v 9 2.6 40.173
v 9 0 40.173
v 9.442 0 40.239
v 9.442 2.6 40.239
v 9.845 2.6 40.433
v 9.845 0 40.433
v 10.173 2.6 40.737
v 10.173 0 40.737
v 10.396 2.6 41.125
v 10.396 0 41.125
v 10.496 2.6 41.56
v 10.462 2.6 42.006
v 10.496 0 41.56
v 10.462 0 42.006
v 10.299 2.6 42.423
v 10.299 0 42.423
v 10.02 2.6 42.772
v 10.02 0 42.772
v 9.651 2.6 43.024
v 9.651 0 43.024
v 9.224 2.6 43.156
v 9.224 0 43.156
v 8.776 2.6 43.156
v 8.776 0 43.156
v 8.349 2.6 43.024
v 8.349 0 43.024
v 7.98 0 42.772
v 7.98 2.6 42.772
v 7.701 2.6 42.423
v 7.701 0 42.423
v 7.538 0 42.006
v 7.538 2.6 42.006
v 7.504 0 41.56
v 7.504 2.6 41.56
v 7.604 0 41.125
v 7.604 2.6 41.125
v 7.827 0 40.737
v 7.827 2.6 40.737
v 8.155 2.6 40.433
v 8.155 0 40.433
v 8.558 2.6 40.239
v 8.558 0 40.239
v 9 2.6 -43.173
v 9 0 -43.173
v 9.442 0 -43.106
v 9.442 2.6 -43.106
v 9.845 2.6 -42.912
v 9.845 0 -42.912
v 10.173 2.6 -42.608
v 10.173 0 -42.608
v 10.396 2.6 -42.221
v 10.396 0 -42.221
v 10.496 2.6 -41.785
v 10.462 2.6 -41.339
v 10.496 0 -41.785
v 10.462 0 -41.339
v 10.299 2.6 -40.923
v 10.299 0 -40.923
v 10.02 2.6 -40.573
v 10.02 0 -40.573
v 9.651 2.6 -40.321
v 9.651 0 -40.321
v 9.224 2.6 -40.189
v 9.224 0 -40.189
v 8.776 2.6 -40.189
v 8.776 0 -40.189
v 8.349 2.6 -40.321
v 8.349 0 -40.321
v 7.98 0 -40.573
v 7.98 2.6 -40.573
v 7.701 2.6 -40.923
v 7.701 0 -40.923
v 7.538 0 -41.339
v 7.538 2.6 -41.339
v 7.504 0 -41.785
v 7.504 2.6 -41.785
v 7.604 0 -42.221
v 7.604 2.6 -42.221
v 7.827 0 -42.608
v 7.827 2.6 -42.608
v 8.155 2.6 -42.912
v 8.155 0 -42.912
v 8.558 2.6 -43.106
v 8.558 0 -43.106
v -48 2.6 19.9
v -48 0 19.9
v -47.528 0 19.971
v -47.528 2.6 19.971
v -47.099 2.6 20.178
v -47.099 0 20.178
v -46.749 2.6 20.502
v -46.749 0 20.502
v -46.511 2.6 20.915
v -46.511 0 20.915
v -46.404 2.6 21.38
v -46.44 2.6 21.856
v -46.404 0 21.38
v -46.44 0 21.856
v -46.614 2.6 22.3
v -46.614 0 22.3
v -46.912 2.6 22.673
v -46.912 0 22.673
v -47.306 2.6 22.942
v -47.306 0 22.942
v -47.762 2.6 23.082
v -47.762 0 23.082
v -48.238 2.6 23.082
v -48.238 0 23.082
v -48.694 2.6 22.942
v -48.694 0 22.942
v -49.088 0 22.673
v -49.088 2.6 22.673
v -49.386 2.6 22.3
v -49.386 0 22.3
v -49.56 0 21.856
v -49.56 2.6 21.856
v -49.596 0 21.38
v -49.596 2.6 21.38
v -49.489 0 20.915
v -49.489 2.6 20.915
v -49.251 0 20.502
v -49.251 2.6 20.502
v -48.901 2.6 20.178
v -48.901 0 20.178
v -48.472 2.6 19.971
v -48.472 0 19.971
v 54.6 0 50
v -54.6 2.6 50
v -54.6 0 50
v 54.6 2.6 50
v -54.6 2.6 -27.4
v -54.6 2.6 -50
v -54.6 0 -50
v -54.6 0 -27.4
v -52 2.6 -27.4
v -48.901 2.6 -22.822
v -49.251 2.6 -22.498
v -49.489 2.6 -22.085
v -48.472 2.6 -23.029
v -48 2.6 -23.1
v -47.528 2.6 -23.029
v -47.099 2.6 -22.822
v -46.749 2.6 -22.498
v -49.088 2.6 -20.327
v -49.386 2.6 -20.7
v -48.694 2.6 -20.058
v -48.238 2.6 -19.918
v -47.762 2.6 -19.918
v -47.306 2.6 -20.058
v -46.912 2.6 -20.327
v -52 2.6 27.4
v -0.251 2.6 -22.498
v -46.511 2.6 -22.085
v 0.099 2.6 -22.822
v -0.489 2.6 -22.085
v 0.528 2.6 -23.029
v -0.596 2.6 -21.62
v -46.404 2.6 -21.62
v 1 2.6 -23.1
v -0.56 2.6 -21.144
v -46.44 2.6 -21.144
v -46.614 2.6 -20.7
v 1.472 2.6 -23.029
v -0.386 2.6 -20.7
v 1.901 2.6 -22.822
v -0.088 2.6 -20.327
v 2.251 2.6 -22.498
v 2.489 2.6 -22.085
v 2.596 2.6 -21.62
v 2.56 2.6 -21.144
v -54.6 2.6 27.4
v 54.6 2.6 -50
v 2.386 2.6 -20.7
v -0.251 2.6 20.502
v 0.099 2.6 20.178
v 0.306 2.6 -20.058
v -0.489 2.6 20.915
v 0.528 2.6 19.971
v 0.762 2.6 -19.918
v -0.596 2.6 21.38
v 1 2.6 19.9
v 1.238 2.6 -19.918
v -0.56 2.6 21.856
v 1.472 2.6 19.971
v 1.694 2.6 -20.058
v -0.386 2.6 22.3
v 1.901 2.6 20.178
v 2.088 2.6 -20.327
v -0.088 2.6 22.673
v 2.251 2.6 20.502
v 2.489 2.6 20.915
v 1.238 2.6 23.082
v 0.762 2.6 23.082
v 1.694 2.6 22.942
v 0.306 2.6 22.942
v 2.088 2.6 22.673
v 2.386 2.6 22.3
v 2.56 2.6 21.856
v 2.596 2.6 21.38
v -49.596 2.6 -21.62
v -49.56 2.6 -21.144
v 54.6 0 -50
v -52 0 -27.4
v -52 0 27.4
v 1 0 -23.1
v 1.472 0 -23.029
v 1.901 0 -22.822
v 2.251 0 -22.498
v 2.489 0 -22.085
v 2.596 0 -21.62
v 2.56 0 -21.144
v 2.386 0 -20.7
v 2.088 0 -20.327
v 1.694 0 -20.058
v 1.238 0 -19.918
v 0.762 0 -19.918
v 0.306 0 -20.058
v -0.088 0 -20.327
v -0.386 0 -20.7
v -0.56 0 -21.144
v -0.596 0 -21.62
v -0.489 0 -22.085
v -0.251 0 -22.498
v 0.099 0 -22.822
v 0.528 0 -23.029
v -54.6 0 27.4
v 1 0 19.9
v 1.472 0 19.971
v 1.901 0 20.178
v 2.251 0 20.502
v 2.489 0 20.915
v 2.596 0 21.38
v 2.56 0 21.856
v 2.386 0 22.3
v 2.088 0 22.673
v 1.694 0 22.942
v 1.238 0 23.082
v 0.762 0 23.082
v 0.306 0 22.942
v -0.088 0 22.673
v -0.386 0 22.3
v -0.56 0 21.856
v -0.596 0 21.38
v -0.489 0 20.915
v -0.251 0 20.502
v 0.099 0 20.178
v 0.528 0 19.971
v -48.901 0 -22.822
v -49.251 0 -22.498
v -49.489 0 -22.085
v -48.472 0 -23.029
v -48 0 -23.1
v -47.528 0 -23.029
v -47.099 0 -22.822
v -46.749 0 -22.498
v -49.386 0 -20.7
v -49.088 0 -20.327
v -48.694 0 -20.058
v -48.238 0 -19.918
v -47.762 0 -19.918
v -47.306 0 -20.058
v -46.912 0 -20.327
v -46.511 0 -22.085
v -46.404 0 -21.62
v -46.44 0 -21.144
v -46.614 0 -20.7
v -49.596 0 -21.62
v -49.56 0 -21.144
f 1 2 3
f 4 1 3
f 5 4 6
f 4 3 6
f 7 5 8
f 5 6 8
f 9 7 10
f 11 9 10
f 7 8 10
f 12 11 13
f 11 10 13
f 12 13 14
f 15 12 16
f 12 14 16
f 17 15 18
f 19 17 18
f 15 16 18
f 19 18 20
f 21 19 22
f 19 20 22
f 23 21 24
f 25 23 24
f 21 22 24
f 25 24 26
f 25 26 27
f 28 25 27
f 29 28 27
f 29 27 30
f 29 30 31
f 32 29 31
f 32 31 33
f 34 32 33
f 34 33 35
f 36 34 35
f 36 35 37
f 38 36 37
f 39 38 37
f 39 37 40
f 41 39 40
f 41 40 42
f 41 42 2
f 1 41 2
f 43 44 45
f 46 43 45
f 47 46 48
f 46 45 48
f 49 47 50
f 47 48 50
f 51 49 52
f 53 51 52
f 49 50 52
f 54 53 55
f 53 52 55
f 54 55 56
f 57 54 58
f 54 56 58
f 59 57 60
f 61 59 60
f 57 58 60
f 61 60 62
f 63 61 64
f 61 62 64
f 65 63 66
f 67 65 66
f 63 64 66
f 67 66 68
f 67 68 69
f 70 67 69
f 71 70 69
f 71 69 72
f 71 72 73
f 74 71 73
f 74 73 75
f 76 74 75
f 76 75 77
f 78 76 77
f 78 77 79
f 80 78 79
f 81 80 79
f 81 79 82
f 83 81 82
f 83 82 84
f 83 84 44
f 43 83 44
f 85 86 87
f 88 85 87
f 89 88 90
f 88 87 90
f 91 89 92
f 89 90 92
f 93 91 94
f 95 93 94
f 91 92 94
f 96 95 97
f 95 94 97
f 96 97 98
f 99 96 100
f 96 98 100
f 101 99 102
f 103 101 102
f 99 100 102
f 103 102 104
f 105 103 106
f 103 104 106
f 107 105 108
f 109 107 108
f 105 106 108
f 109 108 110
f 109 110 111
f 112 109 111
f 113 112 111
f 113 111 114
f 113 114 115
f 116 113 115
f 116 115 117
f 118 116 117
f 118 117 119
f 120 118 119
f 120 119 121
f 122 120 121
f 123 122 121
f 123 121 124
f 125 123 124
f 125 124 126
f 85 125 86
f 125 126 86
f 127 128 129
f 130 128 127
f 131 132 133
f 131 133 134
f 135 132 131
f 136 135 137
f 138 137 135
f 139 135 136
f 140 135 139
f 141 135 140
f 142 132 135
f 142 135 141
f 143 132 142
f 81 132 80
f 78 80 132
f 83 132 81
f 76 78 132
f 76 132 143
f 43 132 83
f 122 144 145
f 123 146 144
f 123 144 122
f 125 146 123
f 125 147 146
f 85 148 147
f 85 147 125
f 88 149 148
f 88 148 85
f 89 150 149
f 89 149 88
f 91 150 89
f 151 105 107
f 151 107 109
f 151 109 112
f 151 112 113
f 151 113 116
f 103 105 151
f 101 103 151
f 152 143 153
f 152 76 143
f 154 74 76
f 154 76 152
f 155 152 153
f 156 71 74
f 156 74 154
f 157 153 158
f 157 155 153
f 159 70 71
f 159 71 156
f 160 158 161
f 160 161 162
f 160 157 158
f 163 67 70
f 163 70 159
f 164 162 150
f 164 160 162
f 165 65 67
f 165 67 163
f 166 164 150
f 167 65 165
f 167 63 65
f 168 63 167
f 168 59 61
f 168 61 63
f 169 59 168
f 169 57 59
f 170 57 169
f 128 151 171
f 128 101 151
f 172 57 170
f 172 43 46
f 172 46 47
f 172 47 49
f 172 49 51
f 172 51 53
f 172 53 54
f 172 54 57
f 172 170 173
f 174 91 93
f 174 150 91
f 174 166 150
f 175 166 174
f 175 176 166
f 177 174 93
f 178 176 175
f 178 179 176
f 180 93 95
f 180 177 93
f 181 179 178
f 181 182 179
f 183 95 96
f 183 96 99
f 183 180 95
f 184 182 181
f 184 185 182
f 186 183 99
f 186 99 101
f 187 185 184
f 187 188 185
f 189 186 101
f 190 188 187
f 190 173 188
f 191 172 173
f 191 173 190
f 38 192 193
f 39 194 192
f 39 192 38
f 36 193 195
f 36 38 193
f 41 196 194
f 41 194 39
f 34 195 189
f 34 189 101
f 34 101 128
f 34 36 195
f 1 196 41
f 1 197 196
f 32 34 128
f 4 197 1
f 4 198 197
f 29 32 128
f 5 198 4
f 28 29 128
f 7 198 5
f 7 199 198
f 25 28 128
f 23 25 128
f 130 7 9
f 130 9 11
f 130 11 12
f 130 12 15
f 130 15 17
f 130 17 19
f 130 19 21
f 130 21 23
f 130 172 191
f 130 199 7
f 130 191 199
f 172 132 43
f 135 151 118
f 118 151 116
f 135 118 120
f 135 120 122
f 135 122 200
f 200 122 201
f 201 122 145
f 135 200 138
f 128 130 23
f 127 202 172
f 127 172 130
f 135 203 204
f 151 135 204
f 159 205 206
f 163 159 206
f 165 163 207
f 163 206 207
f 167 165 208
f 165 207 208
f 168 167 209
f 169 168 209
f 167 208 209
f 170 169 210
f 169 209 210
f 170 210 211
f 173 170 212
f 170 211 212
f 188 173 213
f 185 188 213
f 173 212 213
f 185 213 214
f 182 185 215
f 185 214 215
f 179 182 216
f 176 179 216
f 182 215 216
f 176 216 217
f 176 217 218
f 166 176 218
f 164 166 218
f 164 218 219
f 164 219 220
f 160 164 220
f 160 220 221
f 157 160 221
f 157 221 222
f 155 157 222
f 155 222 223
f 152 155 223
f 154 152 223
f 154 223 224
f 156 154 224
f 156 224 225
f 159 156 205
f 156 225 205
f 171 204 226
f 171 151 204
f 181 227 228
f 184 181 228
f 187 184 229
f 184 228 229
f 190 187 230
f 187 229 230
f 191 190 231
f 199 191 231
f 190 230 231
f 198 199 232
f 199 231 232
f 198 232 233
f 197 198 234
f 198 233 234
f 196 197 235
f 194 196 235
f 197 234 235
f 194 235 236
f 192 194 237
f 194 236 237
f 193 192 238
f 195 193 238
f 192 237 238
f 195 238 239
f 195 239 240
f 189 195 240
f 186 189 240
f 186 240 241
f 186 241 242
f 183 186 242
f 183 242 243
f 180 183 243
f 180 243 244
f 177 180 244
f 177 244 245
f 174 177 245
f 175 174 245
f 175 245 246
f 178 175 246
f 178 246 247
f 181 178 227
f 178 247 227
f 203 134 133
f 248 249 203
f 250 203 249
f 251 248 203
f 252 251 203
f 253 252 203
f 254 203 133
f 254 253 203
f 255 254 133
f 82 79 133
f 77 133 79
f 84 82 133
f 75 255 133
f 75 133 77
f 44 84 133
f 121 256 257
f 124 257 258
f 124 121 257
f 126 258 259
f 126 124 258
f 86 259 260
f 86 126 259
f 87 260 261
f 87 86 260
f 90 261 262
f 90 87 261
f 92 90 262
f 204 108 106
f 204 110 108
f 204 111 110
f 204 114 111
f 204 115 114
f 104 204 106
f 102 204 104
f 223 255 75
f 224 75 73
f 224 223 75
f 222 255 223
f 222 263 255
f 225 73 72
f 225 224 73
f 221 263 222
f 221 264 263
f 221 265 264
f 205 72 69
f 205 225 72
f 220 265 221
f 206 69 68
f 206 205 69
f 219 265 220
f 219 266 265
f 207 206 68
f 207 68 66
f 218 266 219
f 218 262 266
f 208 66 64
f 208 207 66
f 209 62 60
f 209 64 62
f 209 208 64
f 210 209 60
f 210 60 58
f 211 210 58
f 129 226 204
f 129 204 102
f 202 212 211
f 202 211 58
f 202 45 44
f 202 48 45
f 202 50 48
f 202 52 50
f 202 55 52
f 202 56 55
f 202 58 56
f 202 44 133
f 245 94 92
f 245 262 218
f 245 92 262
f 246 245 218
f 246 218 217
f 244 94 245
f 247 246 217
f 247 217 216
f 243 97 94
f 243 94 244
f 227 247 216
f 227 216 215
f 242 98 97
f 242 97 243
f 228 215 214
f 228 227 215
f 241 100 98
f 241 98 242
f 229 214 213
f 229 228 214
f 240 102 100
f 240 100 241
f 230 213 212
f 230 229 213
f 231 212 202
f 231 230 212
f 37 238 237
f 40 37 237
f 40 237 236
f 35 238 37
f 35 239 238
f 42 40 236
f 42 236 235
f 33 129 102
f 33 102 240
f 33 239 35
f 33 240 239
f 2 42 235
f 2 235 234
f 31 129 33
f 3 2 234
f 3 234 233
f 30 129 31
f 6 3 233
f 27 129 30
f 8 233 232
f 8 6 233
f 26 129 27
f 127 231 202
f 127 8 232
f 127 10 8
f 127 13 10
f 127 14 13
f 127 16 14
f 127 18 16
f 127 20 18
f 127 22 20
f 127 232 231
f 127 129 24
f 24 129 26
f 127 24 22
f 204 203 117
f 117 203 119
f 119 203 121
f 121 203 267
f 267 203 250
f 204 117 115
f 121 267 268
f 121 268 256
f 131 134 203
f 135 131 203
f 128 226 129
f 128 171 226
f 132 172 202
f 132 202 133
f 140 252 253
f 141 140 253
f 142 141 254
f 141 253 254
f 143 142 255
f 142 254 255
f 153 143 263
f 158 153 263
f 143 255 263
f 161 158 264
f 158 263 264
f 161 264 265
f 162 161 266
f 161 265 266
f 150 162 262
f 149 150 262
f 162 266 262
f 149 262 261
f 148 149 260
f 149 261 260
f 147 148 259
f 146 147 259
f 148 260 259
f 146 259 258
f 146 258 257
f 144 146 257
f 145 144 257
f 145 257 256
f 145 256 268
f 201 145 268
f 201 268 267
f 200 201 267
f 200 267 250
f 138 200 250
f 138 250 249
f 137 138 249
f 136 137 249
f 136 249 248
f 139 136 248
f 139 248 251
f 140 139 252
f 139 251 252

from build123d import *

# Parameters (mm, degrees)
EXTRUDE_1_DEPTH                  = 2.6
SKETCH_2_W                       = 100
SKETCH_2_H                       = 24
EXTRUDE_2_DEPTH                  = 2.6
SKETCH_4_W                       = 100
SKETCH_4_H                       = 24
EXTRUDE_3_DEPTH                  = 2.6
SKETCH_5_W                       = 62
SKETCH_5_H                       = 100
EXTRUDE_5_DEPTH                  = 2.6
SKETCH_7_W                       = 62
SKETCH_7_H                       = 100
EXTRUDE_6_DEPTH                  = 2.6
SKETCH_8_W                       = 59.4
SKETCH_8_H                       = 60
CUT_EXTRUDE_1_DEPTH              = 2.6
SKETCH_9_W                       = 59.4
SKETCH_9_H                       = 60
CUT_EXTRUDE_2_DEPTH              = 2.6
SKETCH_11_W                      = 59.4
SKETCH_11_H                      = 26.6
EXTRUDE_7_DEPTH                  = 2.6
SKETCH_12_W                      = 59.4
SKETCH_12_H                      = 26.6
EXTRUDE_8_DEPTH                  = 2.6
SKETCH_14_W                      = 59.4
SKETCH_14_H                      = 26.6
EXTRUDE_9_DEPTH                  = 2.6
SKETCH_15_W                      = 59.4
SKETCH_15_H                      = 26.6
EXTRUDE_10_DEPTH                 = 2.6
SKETCH_16_R                      = 1.6
CUT_EXTRUDE_3_DEPTH              = 127.775391934
SKETCH_17_W                      = 80
SKETCH_17_H                      = 64
CUT_EXTRUDE_4_DEPTH              = 127.775391934
SKETCH_21_W                      = 59.4
SKETCH_21_H                      = 54.8
EXTRUDE_11_DEPTH                 = 2.6
SKETCH_22_R                      = 1.6
CUT_EXTRUDE_5_DEPTH              = 2.6
SKETCH_23_W                      = 59.4
SKETCH_23_H                      = 54.8
EXTRUDE_13_DEPTH                 = 2.6
CUT_EXTRUDE_8_DEPTH              = 2.6
SKETCH_25_W                      = 54.8
SKETCH_25_H                      = 21.4
CUT_EXTRUDE_9_DEPTH              = 2.6
CUT_EXTRUDE_11_REACH             = 143.787
SKETCH_28_R                      = 1.5
CUT_EXTRUDE_11_DIRECTION_2_DEPTH = 142.787023384
SKETCH_31_W                      = 41.995824489
SKETCH_31_H                      = 54.8
CUT_EXTRUDE_14_DEPTH             = 2.6
SKETCH_32_W                      = 59.4
SKETCH_32_H                      = 24
CUT_EXTRUDE_15_DEPTH             = 70.6
SKETCH_33_W                      = 104
SKETCH_33_H                      = 100
CUT_EXTRUDE_16_DEPTH             = 2.6
SKETCH_34_W                      = 104
SKETCH_34_H                      = 99.672593916
EXTRUDE_14_DEPTH                 = 2.6
SKETCH_35_R                      = 1.6
CUT_EXTRUDE_24_DEPTH             = 2.6
SKETCH_36_W                      = 59.4
SKETCH_36_H                      = 100
CUT_EXTRUDE_25_DEPTH             = 2.6
SKETCH_37_W                      = 36
SKETCH_37_H                      = 2.6
EXTRUDE_17_DEPTH                 = 36
SKETCH_41_W                      = 36
SKETCH_41_H                      = 12
CUT_EXTRUDE_27_DEPTH             = 2.6
SKETCH_42_R                      = 1.6
CUT_EXTRUDE_28_DEPTH             = 2.6
SKETCH_43_R                      = 2
CUT_EXTRUDE_29_DEPTH             = 2.6
SKETCH_44_W                      = 104
SKETCH_44_H                      = 99.672593916
EXTRUDE_18_DEPTH                 = 2.6
SKETCH_45_R                      = 1.6
CUT_EXTRUDE_30_DEPTH             = 2.6
SKETCH_46_W                      = 80
SKETCH_46_H                      = 64
CUT_EXTRUDE_31_DEPTH             = 2.6
SKETCH_47_W                      = 40
SKETCH_47_H                      = 30
CUT_EXTRUDE_32_DEPTH             = 2.6
SKETCH_48_W                      = 12
SKETCH_48_H                      = 64
CUT_EXTRUDE_33_DEPTH             = 2.6
SKETCH_49_W                      = 40
SKETCH_49_H                      = 20
CUT_EXTRUDE_34_DEPTH             = 2.6
SKETCH_50_W                      = 39.937786469
SKETCH_50_H                      = 20
CUT_EXTRUDE_35_DEPTH             = 2.6
SKETCH_51_R                      = 9
CUT_EXTRUDE_36_DEPTH             = 2.6
CUT_EXTRUDE_38_REACH             = 143.787
SKETCH_52_W                      = 15
SKETCH_52_H                      = 15
SKETCH_55_W                      = 36
SKETCH_55_H                      = 2.6
CUT_EXTRUDE_39_DEPTH             = 12
CUT_EXTRUDE_START                = -109.2
SKETCH_56_W                      = 10
SKETCH_56_H                      = 10
CUT_EXTRUDE_40_DEPTH             = 109.2
CUT_EXTRUDE_41_REACH             = 129.293
SKETCH_57_R                      = 1.5
SKETCH_58_W                      = 104
SKETCH_58_H                      = 2.6
EXTRUDE_19_DEPTH                 = 0.327406084
SKETCH_59_W                      = 59.4
SKETCH_59_H                      = 24
CUT_EXTRUDE_42_DEPTH             = 60
SKETCH_60_W                      = 168.6
SKETCH_60_H                      = 100
CUT_EXTRUDE_43_DEPTH             = 2.6
CUT_EXTRUDE_44_DEPTH             = 200
CUT_EXTRUDE_44_DEPTH_BACK        = 200
SKETCH_61_W                      = 100
SKETCH_61_H                      = 21.4
SKETCH_62_W                      = 20
SKETCH_62_H                      = 2.6
EXTRUDE_20_DEPTH                 = 39.937786469
SKETCH_63_W                      = 40
SKETCH_63_H                      = 2.6
EXTRUDE_21_DEPTH                 = 50
SKETCH_64_R                      = 1.6
CUT_EXTRUDE_45_DEPTH             = 2.6
SKETCH_65_R                      = 1.6
EXTRUDE_23_DEPTH                 = 2.6


with BuildPart() as part:
    # 草图1 → 凸台-拉伸1 (new body)
    with BuildSketch(Plane(origin=(0, 0, 0), x_dir=(1, 0, 0), z_dir=(0, 1, 0))):
        Polygon((52, 50), (0, 50), (-52, 50), (-52, -50), (52, -50), align=None)
    extrude(amount=EXTRUDE_1_DEPTH)

    # 草图2 → 凸台-拉伸2 (add)
    with BuildSketch(Plane.ZY.offset(52)):
        with Locations((0, 12)):
            Rectangle(SKETCH_2_W, SKETCH_2_H)
    extrude(amount=EXTRUDE_2_DEPTH)

    # 草图4 → 凸台-拉伸3 (add)
    with BuildSketch(Plane(origin=(52, 0, 0), x_dir=(0, 0, -1), z_dir=(1, 0, 0))):
        with Locations((0, 12)):
            Rectangle(SKETCH_4_W, SKETCH_4_H)
    extrude(amount=EXTRUDE_3_DEPTH)

    # 草图5 → 凸台-拉伸5 (add)
    with BuildSketch(Plane(origin=(0, 24, 0), x_dir=(1, 0, 0), z_dir=(0, 1, 0))):
        with Locations((-83, 0)):
            Rectangle(SKETCH_5_W, SKETCH_5_H)
    extrude(amount=EXTRUDE_5_DEPTH)

    # 草图7 → 凸台-拉伸6 (add)
    with BuildSketch(Plane(origin=(0, 24, 0), x_dir=(1, 0, 0), z_dir=(0, 1, 0))):
        with Locations((83, 0)):
            Rectangle(SKETCH_7_W, SKETCH_7_H)
    extrude(amount=EXTRUDE_6_DEPTH)

    # 草图8 → 切除-拉伸1 (cut)
    with BuildSketch(Plane(origin=(0, 24, 0), x_dir=(1, 0, 0), z_dir=(0, 1, 0))):
        with Locations((-84.3, 0)):
            Rectangle(SKETCH_8_W, SKETCH_8_H)
    extrude(amount=CUT_EXTRUDE_1_DEPTH, mode=Mode.SUBTRACT)

    # 草图9 → 切除-拉伸2 (cut)
    with BuildSketch(Plane.XZ.offset(-24)):
        with Locations((84.3, 0)):
            Rectangle(SKETCH_9_W, SKETCH_9_H)
    extrude(amount=-CUT_EXTRUDE_2_DEPTH, mode=Mode.SUBTRACT)

    # 草图11 → 凸台-拉伸7 (add)
    with BuildSketch(Plane(origin=(0, 0, 30), x_dir=(-1, 0, 0), z_dir=(0, 0, -1))):
        with Locations((-84.3, 13.3)):
            Rectangle(SKETCH_11_W, SKETCH_11_H)
    extrude(amount=EXTRUDE_7_DEPTH)

    # 草图12 → 凸台-拉伸8 (add)
    with BuildSketch(Plane.XY.offset(-30)):
        with Locations((84.3, 13.3)):
            Rectangle(SKETCH_12_W, SKETCH_12_H)
    extrude(amount=EXTRUDE_8_DEPTH)

    # 草图14 → 凸台-拉伸9 (add)
    with BuildSketch(Plane.XY.offset(-30)):
        with Locations((-84.3, 13.3)):
            Rectangle(SKETCH_14_W, SKETCH_14_H)
    extrude(amount=EXTRUDE_9_DEPTH)

    # 草图15 → 凸台-拉伸10 (add)
    with BuildSketch(Plane(origin=(0, 0, 30), x_dir=(-1, 0, 0), z_dir=(0, 0, -1))):
        with Locations((84.3, 13.3)):
            Rectangle(SKETCH_15_W, SKETCH_15_H)
    extrude(amount=EXTRUDE_10_DEPTH)

    # 草图16 → 切除-拉伸3 (cut, through all)
    with BuildSketch(Plane(origin=(0, 2.6, 0), x_dir=(1, 0, 0), z_dir=(0, 1, 0))):
        with Locations(Location((-47.5, 37.465, 0), (0, 0, 270))):
            Circle(SKETCH_16_R)
        with Locations(Location((47.5, 37.465, 0), (0, 0, 90))):
            Circle(SKETCH_16_R)
        with Locations(Location((-47.5, -37.465, 0), (0, 0, 90))):
            Circle(SKETCH_16_R)
        with Locations(Location((47.5, -37.465, 0), (0, 0, 270))):
            Circle(SKETCH_16_R)
    extrude(amount=-CUT_EXTRUDE_3_DEPTH, mode=Mode.SUBTRACT)

    # 草图17 → 切除-拉伸4 (cut, through all)
    with BuildSketch(Plane(origin=(0, 2.6, 0), x_dir=(1, 0, 0), z_dir=(0, 1, 0))):
        Rectangle(SKETCH_17_W, SKETCH_17_H)
    extrude(amount=-CUT_EXTRUDE_4_DEPTH, mode=Mode.SUBTRACT)

    # 草图21 → 凸台-拉伸11 (add)
    with BuildSketch(Plane.XZ):
        with Locations((-84.3, 0)):
            Rectangle(SKETCH_21_W, SKETCH_21_H)
    extrude(amount=-EXTRUDE_11_DEPTH)

    # 草图22 → 切除-拉伸5 (cut)
    with BuildSketch(Plane(origin=(0, 2.6, 0), x_dir=(1, 0, 0), z_dir=(0, 1, 0))):
        with Locations(Location((-109, 18, 0), (0, 0, 270))):
            Circle(SKETCH_22_R)
        with Locations(Location((-109, 0, 0), (0, 0, 270))):
            Circle(SKETCH_22_R)
        with Locations(Location((-109, -18, 0), (0, 0, 90))):
            Circle(SKETCH_22_R)
    extrude(amount=-CUT_EXTRUDE_5_DEPTH, mode=Mode.SUBTRACT)

    # 草图23 → 凸台-拉伸13 (add)
    with BuildSketch(Plane(origin=(0, 26.6, 0), x_dir=(1, 0, 0), z_dir=(0, 1, 0))):
        with Locations((-84.3, 0)):
            Rectangle(SKETCH_23_W, SKETCH_23_H)
    extrude(amount=-EXTRUDE_13_DEPTH)

    # 草图24 → 切除-拉伸8 (cut)
    with BuildSketch(Plane(origin=(0, 26.6, 0), x_dir=(1, 0, 0), z_dir=(0, 1, 0))):
        Polygon((-114, 27.4), (-104, 27.4), (-104, 0.9702404), (-94.7, 0.9702404), (-94.7, 6.15), (-72, 6.15), (-72, 0.9702404), (-62.7, 0.9702404), (-62.7, -1.0297596), (-72, -1.0297596), (-72, -6.15), (-94.7, -6.15), (-94.7, -1.0297596), (-104, -1.0297596), (-104, -27.4), (-114, -27.4), align=None)
    extrude(amount=-CUT_EXTRUDE_8_DEPTH, mode=Mode.SUBTRACT)

    # 草图25 → 切除-拉伸9 (cut)
    with BuildSketch(Plane.ZY.offset(54.6)):
        with Locations((0, 13.3)):
            Rectangle(SKETCH_25_W, SKETCH_25_H)
    extrude(amount=-CUT_EXTRUDE_9_DEPTH, mode=Mode.SUBTRACT)

    # 切除-拉伸11: up to this face of the body (flat: up to its plane)
    cut_extrude_11_end = Plane(part.part.faces().sort_by_distance((-84.3, 12, -30))[0])
    # 草图28 → 切除-拉伸11 (cut, up to the picked face)
    with BuildSketch(Plane.XY.offset(30), mode=Mode.PRIVATE) as cut_extrude_11_sk1:
        with Locations(Location((-87.2, 20.75, 0), (0, 0, 180))):
            Circle(SKETCH_28_R)
    cut_extrude_11_tool1 = split(extrude(cut_extrude_11_sk1.sketch, amount=-CUT_EXTRUDE_11_REACH, mode=Mode.PRIVATE), bisect_by=cut_extrude_11_end, keep=Keep.BOTH, mode=Mode.PRIVATE)
    # 草图28 → 切除-拉伸11 (cut, up to the picked face)
    with BuildSketch(Plane.XY.offset(30), mode=Mode.PRIVATE) as cut_extrude_11_sk2:
        with Locations(Location((-87.2, 3.25, 0), (0, 0, 180))):
            Circle(SKETCH_28_R)
    cut_extrude_11_tool2 = split(extrude(cut_extrude_11_sk2.sketch, amount=-CUT_EXTRUDE_11_REACH, mode=Mode.PRIVATE), bisect_by=cut_extrude_11_end, keep=Keep.BOTH, mode=Mode.PRIVATE)
    add(cut_extrude_11_tool1.solids().sort_by(Axis((-87.2, 20.75, 30), (0, 0, -1)))[0], mode=Mode.SUBTRACT)
    add(cut_extrude_11_tool2.solids().sort_by(Axis((-87.2, 3.25, 30), (0, 0, -1)))[0], mode=Mode.SUBTRACT)

    # 草图28 → 切除-拉伸11 direction 2 (cut)
    with BuildSketch(Plane.XY.offset(30)):
        with Locations(Location((-87.2, 20.75, 0), (0, 0, 180))):
            Circle(SKETCH_28_R)
        with Locations(Location((-87.2, 3.25, 0), (0, 0, 180))):
            Circle(SKETCH_28_R)
    extrude(amount=CUT_EXTRUDE_11_DIRECTION_2_DEPTH, mode=Mode.SUBTRACT)

    # 草图31 → 切除-拉伸14 (cut)
    with BuildSketch(Plane(origin=(0, 2.6, 0), x_dir=(1, 0, 0), z_dir=(0, 1, 0))):
        with Locations((-72.997912245, 0)):
            Rectangle(SKETCH_31_W, SKETCH_31_H)
    extrude(amount=-CUT_EXTRUDE_14_DEPTH, mode=Mode.SUBTRACT)

    # 草图32 → 切除-拉伸15 (cut)
    with BuildSketch(Plane.XY.offset(30)):
        with Locations((84.3, 12)):
            Rectangle(SKETCH_32_W, SKETCH_32_H)
    extrude(amount=-CUT_EXTRUDE_15_DEPTH, mode=Mode.SUBTRACT)

    # 草图33 → 切除-拉伸16 (cut)
    with BuildSketch(Plane(origin=(0, 2.6, 0), x_dir=(1, 0, 0), z_dir=(0, 1, 0))):
        Rectangle(SKETCH_33_W, SKETCH_33_H)
    extrude(amount=-CUT_EXTRUDE_16_DEPTH, mode=Mode.SUBTRACT)


with BuildPart() as cut_extrude_16_piece_1:
    # of the separate pieces the step leaves, piece 1, a body of its own (cut_extrude_16_pieces)
    add(part.part.solids().sort_by_distance((-52, 0, -50))[0])



with BuildPart() as cut_extrude_16_piece_2:
    # of the separate pieces the step leaves, piece 2, a body of its own (cut_extrude_16_pieces)
    add(part.part.solids().sort_by_distance((114, 26.6, -50))[0])


with BuildPart() as cut_extrude_16_piece_1_1:
    add(cut_extrude_16_piece_1.part)

    add(cut_extrude_16_piece_2.part)  # 凸台-拉伸14 merges 切除-拉伸16 piece 2
    # 草图34 → 凸台-拉伸14 (add)
    with BuildSketch(Plane.XZ):
        with Locations((0, 0.163703042)):
            Rectangle(SKETCH_34_W, SKETCH_34_H)
    extrude(amount=-EXTRUDE_14_DEPTH)

    # 草图35 → 切除-拉伸24 (cut)
    with BuildSketch(Plane(origin=(0, 2.6, 0), x_dir=(1, 0, 0), z_dir=(0, 1, 0))):
        with Locations(Location((-39.5, 21.5, 0), (0, 0, 270))):
            Circle(SKETCH_35_R)
        with Locations(Location((9.5, 21.5, 0), (0, 0, 270))):
            Circle(SKETCH_35_R)
        with Locations(Location((9.5, -21.5, 0), (0, 0, 90))):
            Circle(SKETCH_35_R)
        with Locations(Location((-39.5, -21.5, 0), (0, 0, 90))):
            Circle(SKETCH_35_R)
    extrude(amount=-CUT_EXTRUDE_24_DEPTH, mode=Mode.SUBTRACT)

    # 草图36 → 切除-拉伸25 (cut)
    with BuildSketch(Plane(origin=(0, 26.6, 0), x_dir=(1, 0, 0), z_dir=(0, 1, 0))):
        with Locations((84.3, 0)):
            Rectangle(SKETCH_36_W, SKETCH_36_H)
    extrude(amount=-CUT_EXTRUDE_25_DEPTH, mode=Mode.SUBTRACT)

    # 草图37 → 凸台-拉伸17 (add)
    with BuildSketch(Plane(origin=(54.6, 0, 0), x_dir=(0, 0, -1), z_dir=(1, 0, 0))):
        with Locations((0, 13.3)):
            Rectangle(SKETCH_37_W, SKETCH_37_H)
    extrude(amount=EXTRUDE_17_DEPTH)

    # 草图41 → 切除-拉伸27 (cut)
    with BuildSketch(Plane(origin=(54.6, 0, 0), x_dir=(0, 0, -1), z_dir=(1, 0, 0))):
        with Locations((0, 20.6)):
            Rectangle(SKETCH_41_W, SKETCH_41_H)
    extrude(amount=-CUT_EXTRUDE_27_DEPTH, mode=Mode.SUBTRACT)

    # 草图42 → 切除-拉伸28 (cut)
    with BuildSketch(Plane(origin=(0, 14.6, 0), x_dir=(1, 0, 0), z_dir=(0, 1, 0))):
        with Locations(Location((88.1, 15.5, 0), (0, 0, 270))):
            Circle(SKETCH_42_R)
        with Locations(Location((88.1, -15.5, 0), (0, 0, 90))):
            Circle(SKETCH_42_R)
        with Locations(Location((57.1, 15.5, 0), (0, 0, 270))):
            Circle(SKETCH_42_R)
        with Locations(Location((57.1, -15.5, 0), (0, 0, 90))):
            Circle(SKETCH_42_R)
    extrude(amount=-CUT_EXTRUDE_28_DEPTH, mode=Mode.SUBTRACT)

    # 草图43 → 切除-拉伸29 (cut)
    with BuildSketch(Plane(origin=(0, 14.6, 0), x_dir=(1, 0, 0), z_dir=(0, 1, 0))):
        with Locations(Location((61.1, 14.5, 0), (0, 0, 270))):
            Circle(SKETCH_43_R)
        with Locations(Location((84.1, 14.5, 0), (0, 0, 270))):
            Circle(SKETCH_43_R)
        with Locations(Location((84.1, -14.5, 0), (0, 0, 90))):
            Circle(SKETCH_43_R)
        with Locations(Location((61.1, -14.5, 0), (0, 0, 90))):
            Circle(SKETCH_43_R)
    extrude(amount=-CUT_EXTRUDE_29_DEPTH, mode=Mode.SUBTRACT)

    # 草图44 → 凸台-拉伸18 (add)
    with BuildSketch(Plane(origin=(0, 26.6, 0), x_dir=(1, 0, 0), z_dir=(0, 1, 0))):
        with Locations((0, -0.163703042)):
            Rectangle(SKETCH_44_W, SKETCH_44_H)
    extrude(amount=-EXTRUDE_18_DEPTH)

    # 草图45 → 切除-拉伸30 (cut)
    with BuildSketch(Plane(origin=(0, 26.6, 0), x_dir=(1, 0, 0), z_dir=(0, 1, 0))):
        with Locations(Location((-47.5, -37.465, 0), (0, 0, 270))):
            Circle(SKETCH_45_R)
        with Locations(Location((-47.5, 37.465, 0), (0, 0, 90))):
            Circle(SKETCH_45_R)
        with Locations(Location((47.5, -37.465, 0), (0, 0, 90))):
            Circle(SKETCH_45_R)
        with Locations(Location((47.5, 37.465, 0), (0, 0, 270))):
            Circle(SKETCH_45_R)
    extrude(amount=-CUT_EXTRUDE_30_DEPTH, mode=Mode.SUBTRACT)

    # 草图46 → 切除-拉伸31 (cut)
    with BuildSketch(Plane(origin=(0, 26.6, 0), x_dir=(1, 0, 0), z_dir=(0, 1, 0))):
        Rectangle(SKETCH_46_W, SKETCH_46_H)
    extrude(amount=-CUT_EXTRUDE_31_DEPTH, mode=Mode.SUBTRACT)

    # 草图47 → 切除-拉伸32 (cut)
    with BuildSketch(Plane(origin=(0, 2.6, 0), x_dir=(1, 0, 0), z_dir=(0, 1, 0))):
        with Locations((-15, 0)):
            Rectangle(SKETCH_47_W, SKETCH_47_H)
    extrude(amount=-CUT_EXTRUDE_32_DEPTH, mode=Mode.SUBTRACT)

    # 草图48 → 切除-拉伸33 (cut)
    with BuildSketch(Plane(origin=(0, 26.6, 0), x_dir=(1, 0, 0), z_dir=(0, 1, 0))):
        with Locations((-46, 0)):
            Rectangle(SKETCH_48_W, SKETCH_48_H)
    extrude(amount=-CUT_EXTRUDE_33_DEPTH, mode=Mode.SUBTRACT)

    # 草图49 → 切除-拉伸34 (cut)
    with BuildSketch(Plane(origin=(0, 2.6, 0), x_dir=(1, 0, 0), z_dir=(0, 1, 0))):
        with Locations((-15, -25)):
            Rectangle(SKETCH_49_W, SKETCH_49_H)
    extrude(amount=-CUT_EXTRUDE_34_DEPTH, mode=Mode.SUBTRACT)

    # 草图50 → 切除-拉伸35 (cut)
    with BuildSketch(Plane(origin=(0, 2.6, 0), x_dir=(1, 0, 0), z_dir=(0, 1, 0))):
        with Locations((-15.031106765, 25)):
            Rectangle(SKETCH_50_W, SKETCH_50_H)
    extrude(amount=-CUT_EXTRUDE_35_DEPTH, mode=Mode.SUBTRACT)

    # 草图51 → 切除-拉伸36 (cut)
    with BuildSketch(Plane(origin=(0, 14.6, 0), x_dir=(1, 0, 0), z_dir=(0, 1, 0))):
        with Locations(Location((71.3, 0, 0), (0, 0, 270))):
            Circle(SKETCH_51_R)
    extrude(amount=-CUT_EXTRUDE_36_DEPTH, mode=Mode.SUBTRACT)

    # 切除-拉伸38: up to this face of the body (flat: up to its plane)
    cut_extrude_38_end = Plane(cut_extrude_16_piece_1_1.part.faces().sort_by_distance((-84.270953692, 12, -30))[0])
    # 草图52 → 切除-拉伸38 (cut, up to the picked face)
    with BuildSketch(Plane.XY.offset(30), mode=Mode.PRIVATE) as cut_extrude_38_sk1:
        with Locations((-74.7, 12)):
            Rectangle(SKETCH_52_W, SKETCH_52_H)
    cut_extrude_38_tool1 = split(extrude(cut_extrude_38_sk1.sketch, amount=-CUT_EXTRUDE_38_REACH, mode=Mode.PRIVATE), bisect_by=cut_extrude_38_end, keep=Keep.BOTH, mode=Mode.PRIVATE)
    # 草图52 → 切除-拉伸38 (cut, up to the picked face)
    with BuildSketch(Plane.XY.offset(30), mode=Mode.PRIVATE) as cut_extrude_38_sk2:
        with Locations((-99.7, 12)):
            Rectangle(SKETCH_52_W, SKETCH_52_H)
    cut_extrude_38_tool2 = split(extrude(cut_extrude_38_sk2.sketch, amount=-CUT_EXTRUDE_38_REACH, mode=Mode.PRIVATE), bisect_by=cut_extrude_38_end, keep=Keep.BOTH, mode=Mode.PRIVATE)
    add(cut_extrude_38_tool1.solids().sort_by(Axis((-74.7, 12, 30), (0, 0, -1)))[0], mode=Mode.SUBTRACT)
    add(cut_extrude_38_tool2.solids().sort_by(Axis((-99.7, 12, 30), (0, 0, -1)))[0], mode=Mode.SUBTRACT)

    # 草图55 → 切除-拉伸39 (cut)
    with BuildSketch(Plane(origin=(52, 0, 0), x_dir=(0, 0, -1), z_dir=(1, 0, 0))):
        with Locations((0, 25.3)):
            Rectangle(SKETCH_55_W, SKETCH_55_H)
    extrude(amount=-CUT_EXTRUDE_39_DEPTH, mode=Mode.SUBTRACT)

    # 草图56 → 切除-拉伸40 (cut)
    with BuildSketch(Plane(origin=(54.6, 0, 0), x_dir=(0, 0, -1), z_dir=(1, 0, 0)).offset(CUT_EXTRUDE_START)):
        with Locations((-37, 13.3)):
            Rectangle(SKETCH_56_W, SKETCH_56_H)
        with Locations((37, 13.3)):
            Rectangle(SKETCH_56_W, SKETCH_56_H)
    extrude(amount=CUT_EXTRUDE_40_DEPTH, mode=Mode.SUBTRACT)

    # 切除-拉伸41: up to this face of the body (flat: up to its plane)
    cut_extrude_41_end = Plane(cut_extrude_16_piece_1_1.part.faces().sort_by_distance((52.639745935, 26.6, -34))[0])
    # 草图57 → 切除-拉伸41 (cut, up to the picked face)
    with BuildSketch(Plane.XZ, mode=Mode.PRIVATE) as cut_extrude_41_sk1:
        with Locations(Location((9, -41.672593916, 0), (0, 0, 270))):
            Circle(SKETCH_57_R)
    cut_extrude_41_tool1 = split(extrude(cut_extrude_41_sk1.sketch, amount=-CUT_EXTRUDE_41_REACH, mode=Mode.PRIVATE), bisect_by=cut_extrude_41_end, keep=Keep.BOTH, mode=Mode.PRIVATE)
    # 草图57 → 切除-拉伸41 (cut, up to the picked face)
    with BuildSketch(Plane.XZ, mode=Mode.PRIVATE) as cut_extrude_41_sk2:
        with Locations(Location((9, 41.672593916, 0), (0, 0, 270))):
            Circle(SKETCH_57_R)
    cut_extrude_41_tool2 = split(extrude(cut_extrude_41_sk2.sketch, amount=-CUT_EXTRUDE_41_REACH, mode=Mode.PRIVATE), bisect_by=cut_extrude_41_end, keep=Keep.BOTH, mode=Mode.PRIVATE)
    add(cut_extrude_41_tool1.solids().sort_by(Axis((9, 0, -41.672594), (0, 1, 0)))[0], mode=Mode.SUBTRACT)
    add(cut_extrude_41_tool2.solids().sort_by(Axis((9, 0, 41.672594), (0, 1, 0)))[0], mode=Mode.SUBTRACT)

    # 草图58 → 凸台-拉伸19 (add)
    with BuildSketch(Plane(origin=(0, 0, -49.672593916), x_dir=(-1, 0, 0), z_dir=(0, 0, -1))):
        with Locations((0, 25.3)):
            Rectangle(SKETCH_58_W, SKETCH_58_H)
        with Locations((0, 1.3)):
            Rectangle(SKETCH_58_W, SKETCH_58_H)
    extrude(amount=EXTRUDE_19_DEPTH)

    # 草图59 → 切除-拉伸42 (cut)
    with BuildSketch(Plane(origin=(0, 0, -30), x_dir=(-1, 0, 0), z_dir=(0, 0, -1))):
        with Locations((84.3, 12)):
            Rectangle(SKETCH_59_W, SKETCH_59_H)
    extrude(amount=-CUT_EXTRUDE_42_DEPTH, mode=Mode.SUBTRACT)

    # 草图60 → 切除-拉伸43 (cut)
    with BuildSketch(Plane(origin=(0, 26.6, 0), x_dir=(1, 0, 0), z_dir=(0, 1, 0))):
        with Locations((-29.7, 0)):
            Rectangle(SKETCH_60_W, SKETCH_60_H)
    extrude(amount=-CUT_EXTRUDE_43_DEPTH, mode=Mode.SUBTRACT)

    # 草图61 → 切除-拉伸44 (cut, two sides: drawn at the far end of the back side and taken through both)
    with BuildSketch(Plane(origin=(-52, 0, 0), x_dir=(0, 0, -1), z_dir=(1, 0, 0)).offset(-CUT_EXTRUDE_44_DEPTH_BACK)):
        with Locations((0, 13.3)):
            Rectangle(SKETCH_61_W, SKETCH_61_H)
    extrude(amount=CUT_EXTRUDE_44_DEPTH + CUT_EXTRUDE_44_DEPTH_BACK, mode=Mode.SUBTRACT)

    # 草图62 → 凸台-拉伸20 (add)
    with BuildSketch(Plane.ZY.offset(-4.937786469)):
        with Locations((-25, 1.3)):
            Rectangle(SKETCH_62_W, SKETCH_62_H)
    extrude(amount=EXTRUDE_20_DEPTH)

    # 草图63 → 凸台-拉伸21 (add)
    with BuildSketch(Plane.XY.offset(-15)):
        with Locations((-15, 1.3)):
            Rectangle(SKETCH_63_W, SKETCH_63_H)
    extrude(amount=EXTRUDE_21_DEPTH)

    # 草图64 → 切除-拉伸45 (cut)
    with BuildSketch(Plane.XZ):
        with Locations(Location((-48, 21.5, 0), (0, 0, 270))):
            Circle(SKETCH_64_R)
        with Locations(Location((-48, -21.5, 0), (0, 0, 270))):
            Circle(SKETCH_64_R)
        with Locations(Location((1, 21.5, 0), (0, 0, 270))):
            Circle(SKETCH_64_R)
        with Locations(Location((1, -21.5, 0), (0, 0, 270))):
            Circle(SKETCH_64_R)
    extrude(amount=-CUT_EXTRUDE_45_DEPTH, mode=Mode.SUBTRACT)

    # 草图65 → 凸台-拉伸23 (add)
    with BuildSketch(Plane.XZ):
        with Locations((-39.5, 21.5)):
            Circle(SKETCH_65_R)
        with Locations((-39.5, -21.5)):
            Circle(SKETCH_65_R)
        with Locations((9.5, -21.5)):
            Circle(SKETCH_65_R)
        with Locations((9.5, 21.5)):
            Circle(SKETCH_65_R)
    extrude(amount=-EXTRUDE_23_DEPTH)


solid = cut_extrude_16_piece_1_1.part
